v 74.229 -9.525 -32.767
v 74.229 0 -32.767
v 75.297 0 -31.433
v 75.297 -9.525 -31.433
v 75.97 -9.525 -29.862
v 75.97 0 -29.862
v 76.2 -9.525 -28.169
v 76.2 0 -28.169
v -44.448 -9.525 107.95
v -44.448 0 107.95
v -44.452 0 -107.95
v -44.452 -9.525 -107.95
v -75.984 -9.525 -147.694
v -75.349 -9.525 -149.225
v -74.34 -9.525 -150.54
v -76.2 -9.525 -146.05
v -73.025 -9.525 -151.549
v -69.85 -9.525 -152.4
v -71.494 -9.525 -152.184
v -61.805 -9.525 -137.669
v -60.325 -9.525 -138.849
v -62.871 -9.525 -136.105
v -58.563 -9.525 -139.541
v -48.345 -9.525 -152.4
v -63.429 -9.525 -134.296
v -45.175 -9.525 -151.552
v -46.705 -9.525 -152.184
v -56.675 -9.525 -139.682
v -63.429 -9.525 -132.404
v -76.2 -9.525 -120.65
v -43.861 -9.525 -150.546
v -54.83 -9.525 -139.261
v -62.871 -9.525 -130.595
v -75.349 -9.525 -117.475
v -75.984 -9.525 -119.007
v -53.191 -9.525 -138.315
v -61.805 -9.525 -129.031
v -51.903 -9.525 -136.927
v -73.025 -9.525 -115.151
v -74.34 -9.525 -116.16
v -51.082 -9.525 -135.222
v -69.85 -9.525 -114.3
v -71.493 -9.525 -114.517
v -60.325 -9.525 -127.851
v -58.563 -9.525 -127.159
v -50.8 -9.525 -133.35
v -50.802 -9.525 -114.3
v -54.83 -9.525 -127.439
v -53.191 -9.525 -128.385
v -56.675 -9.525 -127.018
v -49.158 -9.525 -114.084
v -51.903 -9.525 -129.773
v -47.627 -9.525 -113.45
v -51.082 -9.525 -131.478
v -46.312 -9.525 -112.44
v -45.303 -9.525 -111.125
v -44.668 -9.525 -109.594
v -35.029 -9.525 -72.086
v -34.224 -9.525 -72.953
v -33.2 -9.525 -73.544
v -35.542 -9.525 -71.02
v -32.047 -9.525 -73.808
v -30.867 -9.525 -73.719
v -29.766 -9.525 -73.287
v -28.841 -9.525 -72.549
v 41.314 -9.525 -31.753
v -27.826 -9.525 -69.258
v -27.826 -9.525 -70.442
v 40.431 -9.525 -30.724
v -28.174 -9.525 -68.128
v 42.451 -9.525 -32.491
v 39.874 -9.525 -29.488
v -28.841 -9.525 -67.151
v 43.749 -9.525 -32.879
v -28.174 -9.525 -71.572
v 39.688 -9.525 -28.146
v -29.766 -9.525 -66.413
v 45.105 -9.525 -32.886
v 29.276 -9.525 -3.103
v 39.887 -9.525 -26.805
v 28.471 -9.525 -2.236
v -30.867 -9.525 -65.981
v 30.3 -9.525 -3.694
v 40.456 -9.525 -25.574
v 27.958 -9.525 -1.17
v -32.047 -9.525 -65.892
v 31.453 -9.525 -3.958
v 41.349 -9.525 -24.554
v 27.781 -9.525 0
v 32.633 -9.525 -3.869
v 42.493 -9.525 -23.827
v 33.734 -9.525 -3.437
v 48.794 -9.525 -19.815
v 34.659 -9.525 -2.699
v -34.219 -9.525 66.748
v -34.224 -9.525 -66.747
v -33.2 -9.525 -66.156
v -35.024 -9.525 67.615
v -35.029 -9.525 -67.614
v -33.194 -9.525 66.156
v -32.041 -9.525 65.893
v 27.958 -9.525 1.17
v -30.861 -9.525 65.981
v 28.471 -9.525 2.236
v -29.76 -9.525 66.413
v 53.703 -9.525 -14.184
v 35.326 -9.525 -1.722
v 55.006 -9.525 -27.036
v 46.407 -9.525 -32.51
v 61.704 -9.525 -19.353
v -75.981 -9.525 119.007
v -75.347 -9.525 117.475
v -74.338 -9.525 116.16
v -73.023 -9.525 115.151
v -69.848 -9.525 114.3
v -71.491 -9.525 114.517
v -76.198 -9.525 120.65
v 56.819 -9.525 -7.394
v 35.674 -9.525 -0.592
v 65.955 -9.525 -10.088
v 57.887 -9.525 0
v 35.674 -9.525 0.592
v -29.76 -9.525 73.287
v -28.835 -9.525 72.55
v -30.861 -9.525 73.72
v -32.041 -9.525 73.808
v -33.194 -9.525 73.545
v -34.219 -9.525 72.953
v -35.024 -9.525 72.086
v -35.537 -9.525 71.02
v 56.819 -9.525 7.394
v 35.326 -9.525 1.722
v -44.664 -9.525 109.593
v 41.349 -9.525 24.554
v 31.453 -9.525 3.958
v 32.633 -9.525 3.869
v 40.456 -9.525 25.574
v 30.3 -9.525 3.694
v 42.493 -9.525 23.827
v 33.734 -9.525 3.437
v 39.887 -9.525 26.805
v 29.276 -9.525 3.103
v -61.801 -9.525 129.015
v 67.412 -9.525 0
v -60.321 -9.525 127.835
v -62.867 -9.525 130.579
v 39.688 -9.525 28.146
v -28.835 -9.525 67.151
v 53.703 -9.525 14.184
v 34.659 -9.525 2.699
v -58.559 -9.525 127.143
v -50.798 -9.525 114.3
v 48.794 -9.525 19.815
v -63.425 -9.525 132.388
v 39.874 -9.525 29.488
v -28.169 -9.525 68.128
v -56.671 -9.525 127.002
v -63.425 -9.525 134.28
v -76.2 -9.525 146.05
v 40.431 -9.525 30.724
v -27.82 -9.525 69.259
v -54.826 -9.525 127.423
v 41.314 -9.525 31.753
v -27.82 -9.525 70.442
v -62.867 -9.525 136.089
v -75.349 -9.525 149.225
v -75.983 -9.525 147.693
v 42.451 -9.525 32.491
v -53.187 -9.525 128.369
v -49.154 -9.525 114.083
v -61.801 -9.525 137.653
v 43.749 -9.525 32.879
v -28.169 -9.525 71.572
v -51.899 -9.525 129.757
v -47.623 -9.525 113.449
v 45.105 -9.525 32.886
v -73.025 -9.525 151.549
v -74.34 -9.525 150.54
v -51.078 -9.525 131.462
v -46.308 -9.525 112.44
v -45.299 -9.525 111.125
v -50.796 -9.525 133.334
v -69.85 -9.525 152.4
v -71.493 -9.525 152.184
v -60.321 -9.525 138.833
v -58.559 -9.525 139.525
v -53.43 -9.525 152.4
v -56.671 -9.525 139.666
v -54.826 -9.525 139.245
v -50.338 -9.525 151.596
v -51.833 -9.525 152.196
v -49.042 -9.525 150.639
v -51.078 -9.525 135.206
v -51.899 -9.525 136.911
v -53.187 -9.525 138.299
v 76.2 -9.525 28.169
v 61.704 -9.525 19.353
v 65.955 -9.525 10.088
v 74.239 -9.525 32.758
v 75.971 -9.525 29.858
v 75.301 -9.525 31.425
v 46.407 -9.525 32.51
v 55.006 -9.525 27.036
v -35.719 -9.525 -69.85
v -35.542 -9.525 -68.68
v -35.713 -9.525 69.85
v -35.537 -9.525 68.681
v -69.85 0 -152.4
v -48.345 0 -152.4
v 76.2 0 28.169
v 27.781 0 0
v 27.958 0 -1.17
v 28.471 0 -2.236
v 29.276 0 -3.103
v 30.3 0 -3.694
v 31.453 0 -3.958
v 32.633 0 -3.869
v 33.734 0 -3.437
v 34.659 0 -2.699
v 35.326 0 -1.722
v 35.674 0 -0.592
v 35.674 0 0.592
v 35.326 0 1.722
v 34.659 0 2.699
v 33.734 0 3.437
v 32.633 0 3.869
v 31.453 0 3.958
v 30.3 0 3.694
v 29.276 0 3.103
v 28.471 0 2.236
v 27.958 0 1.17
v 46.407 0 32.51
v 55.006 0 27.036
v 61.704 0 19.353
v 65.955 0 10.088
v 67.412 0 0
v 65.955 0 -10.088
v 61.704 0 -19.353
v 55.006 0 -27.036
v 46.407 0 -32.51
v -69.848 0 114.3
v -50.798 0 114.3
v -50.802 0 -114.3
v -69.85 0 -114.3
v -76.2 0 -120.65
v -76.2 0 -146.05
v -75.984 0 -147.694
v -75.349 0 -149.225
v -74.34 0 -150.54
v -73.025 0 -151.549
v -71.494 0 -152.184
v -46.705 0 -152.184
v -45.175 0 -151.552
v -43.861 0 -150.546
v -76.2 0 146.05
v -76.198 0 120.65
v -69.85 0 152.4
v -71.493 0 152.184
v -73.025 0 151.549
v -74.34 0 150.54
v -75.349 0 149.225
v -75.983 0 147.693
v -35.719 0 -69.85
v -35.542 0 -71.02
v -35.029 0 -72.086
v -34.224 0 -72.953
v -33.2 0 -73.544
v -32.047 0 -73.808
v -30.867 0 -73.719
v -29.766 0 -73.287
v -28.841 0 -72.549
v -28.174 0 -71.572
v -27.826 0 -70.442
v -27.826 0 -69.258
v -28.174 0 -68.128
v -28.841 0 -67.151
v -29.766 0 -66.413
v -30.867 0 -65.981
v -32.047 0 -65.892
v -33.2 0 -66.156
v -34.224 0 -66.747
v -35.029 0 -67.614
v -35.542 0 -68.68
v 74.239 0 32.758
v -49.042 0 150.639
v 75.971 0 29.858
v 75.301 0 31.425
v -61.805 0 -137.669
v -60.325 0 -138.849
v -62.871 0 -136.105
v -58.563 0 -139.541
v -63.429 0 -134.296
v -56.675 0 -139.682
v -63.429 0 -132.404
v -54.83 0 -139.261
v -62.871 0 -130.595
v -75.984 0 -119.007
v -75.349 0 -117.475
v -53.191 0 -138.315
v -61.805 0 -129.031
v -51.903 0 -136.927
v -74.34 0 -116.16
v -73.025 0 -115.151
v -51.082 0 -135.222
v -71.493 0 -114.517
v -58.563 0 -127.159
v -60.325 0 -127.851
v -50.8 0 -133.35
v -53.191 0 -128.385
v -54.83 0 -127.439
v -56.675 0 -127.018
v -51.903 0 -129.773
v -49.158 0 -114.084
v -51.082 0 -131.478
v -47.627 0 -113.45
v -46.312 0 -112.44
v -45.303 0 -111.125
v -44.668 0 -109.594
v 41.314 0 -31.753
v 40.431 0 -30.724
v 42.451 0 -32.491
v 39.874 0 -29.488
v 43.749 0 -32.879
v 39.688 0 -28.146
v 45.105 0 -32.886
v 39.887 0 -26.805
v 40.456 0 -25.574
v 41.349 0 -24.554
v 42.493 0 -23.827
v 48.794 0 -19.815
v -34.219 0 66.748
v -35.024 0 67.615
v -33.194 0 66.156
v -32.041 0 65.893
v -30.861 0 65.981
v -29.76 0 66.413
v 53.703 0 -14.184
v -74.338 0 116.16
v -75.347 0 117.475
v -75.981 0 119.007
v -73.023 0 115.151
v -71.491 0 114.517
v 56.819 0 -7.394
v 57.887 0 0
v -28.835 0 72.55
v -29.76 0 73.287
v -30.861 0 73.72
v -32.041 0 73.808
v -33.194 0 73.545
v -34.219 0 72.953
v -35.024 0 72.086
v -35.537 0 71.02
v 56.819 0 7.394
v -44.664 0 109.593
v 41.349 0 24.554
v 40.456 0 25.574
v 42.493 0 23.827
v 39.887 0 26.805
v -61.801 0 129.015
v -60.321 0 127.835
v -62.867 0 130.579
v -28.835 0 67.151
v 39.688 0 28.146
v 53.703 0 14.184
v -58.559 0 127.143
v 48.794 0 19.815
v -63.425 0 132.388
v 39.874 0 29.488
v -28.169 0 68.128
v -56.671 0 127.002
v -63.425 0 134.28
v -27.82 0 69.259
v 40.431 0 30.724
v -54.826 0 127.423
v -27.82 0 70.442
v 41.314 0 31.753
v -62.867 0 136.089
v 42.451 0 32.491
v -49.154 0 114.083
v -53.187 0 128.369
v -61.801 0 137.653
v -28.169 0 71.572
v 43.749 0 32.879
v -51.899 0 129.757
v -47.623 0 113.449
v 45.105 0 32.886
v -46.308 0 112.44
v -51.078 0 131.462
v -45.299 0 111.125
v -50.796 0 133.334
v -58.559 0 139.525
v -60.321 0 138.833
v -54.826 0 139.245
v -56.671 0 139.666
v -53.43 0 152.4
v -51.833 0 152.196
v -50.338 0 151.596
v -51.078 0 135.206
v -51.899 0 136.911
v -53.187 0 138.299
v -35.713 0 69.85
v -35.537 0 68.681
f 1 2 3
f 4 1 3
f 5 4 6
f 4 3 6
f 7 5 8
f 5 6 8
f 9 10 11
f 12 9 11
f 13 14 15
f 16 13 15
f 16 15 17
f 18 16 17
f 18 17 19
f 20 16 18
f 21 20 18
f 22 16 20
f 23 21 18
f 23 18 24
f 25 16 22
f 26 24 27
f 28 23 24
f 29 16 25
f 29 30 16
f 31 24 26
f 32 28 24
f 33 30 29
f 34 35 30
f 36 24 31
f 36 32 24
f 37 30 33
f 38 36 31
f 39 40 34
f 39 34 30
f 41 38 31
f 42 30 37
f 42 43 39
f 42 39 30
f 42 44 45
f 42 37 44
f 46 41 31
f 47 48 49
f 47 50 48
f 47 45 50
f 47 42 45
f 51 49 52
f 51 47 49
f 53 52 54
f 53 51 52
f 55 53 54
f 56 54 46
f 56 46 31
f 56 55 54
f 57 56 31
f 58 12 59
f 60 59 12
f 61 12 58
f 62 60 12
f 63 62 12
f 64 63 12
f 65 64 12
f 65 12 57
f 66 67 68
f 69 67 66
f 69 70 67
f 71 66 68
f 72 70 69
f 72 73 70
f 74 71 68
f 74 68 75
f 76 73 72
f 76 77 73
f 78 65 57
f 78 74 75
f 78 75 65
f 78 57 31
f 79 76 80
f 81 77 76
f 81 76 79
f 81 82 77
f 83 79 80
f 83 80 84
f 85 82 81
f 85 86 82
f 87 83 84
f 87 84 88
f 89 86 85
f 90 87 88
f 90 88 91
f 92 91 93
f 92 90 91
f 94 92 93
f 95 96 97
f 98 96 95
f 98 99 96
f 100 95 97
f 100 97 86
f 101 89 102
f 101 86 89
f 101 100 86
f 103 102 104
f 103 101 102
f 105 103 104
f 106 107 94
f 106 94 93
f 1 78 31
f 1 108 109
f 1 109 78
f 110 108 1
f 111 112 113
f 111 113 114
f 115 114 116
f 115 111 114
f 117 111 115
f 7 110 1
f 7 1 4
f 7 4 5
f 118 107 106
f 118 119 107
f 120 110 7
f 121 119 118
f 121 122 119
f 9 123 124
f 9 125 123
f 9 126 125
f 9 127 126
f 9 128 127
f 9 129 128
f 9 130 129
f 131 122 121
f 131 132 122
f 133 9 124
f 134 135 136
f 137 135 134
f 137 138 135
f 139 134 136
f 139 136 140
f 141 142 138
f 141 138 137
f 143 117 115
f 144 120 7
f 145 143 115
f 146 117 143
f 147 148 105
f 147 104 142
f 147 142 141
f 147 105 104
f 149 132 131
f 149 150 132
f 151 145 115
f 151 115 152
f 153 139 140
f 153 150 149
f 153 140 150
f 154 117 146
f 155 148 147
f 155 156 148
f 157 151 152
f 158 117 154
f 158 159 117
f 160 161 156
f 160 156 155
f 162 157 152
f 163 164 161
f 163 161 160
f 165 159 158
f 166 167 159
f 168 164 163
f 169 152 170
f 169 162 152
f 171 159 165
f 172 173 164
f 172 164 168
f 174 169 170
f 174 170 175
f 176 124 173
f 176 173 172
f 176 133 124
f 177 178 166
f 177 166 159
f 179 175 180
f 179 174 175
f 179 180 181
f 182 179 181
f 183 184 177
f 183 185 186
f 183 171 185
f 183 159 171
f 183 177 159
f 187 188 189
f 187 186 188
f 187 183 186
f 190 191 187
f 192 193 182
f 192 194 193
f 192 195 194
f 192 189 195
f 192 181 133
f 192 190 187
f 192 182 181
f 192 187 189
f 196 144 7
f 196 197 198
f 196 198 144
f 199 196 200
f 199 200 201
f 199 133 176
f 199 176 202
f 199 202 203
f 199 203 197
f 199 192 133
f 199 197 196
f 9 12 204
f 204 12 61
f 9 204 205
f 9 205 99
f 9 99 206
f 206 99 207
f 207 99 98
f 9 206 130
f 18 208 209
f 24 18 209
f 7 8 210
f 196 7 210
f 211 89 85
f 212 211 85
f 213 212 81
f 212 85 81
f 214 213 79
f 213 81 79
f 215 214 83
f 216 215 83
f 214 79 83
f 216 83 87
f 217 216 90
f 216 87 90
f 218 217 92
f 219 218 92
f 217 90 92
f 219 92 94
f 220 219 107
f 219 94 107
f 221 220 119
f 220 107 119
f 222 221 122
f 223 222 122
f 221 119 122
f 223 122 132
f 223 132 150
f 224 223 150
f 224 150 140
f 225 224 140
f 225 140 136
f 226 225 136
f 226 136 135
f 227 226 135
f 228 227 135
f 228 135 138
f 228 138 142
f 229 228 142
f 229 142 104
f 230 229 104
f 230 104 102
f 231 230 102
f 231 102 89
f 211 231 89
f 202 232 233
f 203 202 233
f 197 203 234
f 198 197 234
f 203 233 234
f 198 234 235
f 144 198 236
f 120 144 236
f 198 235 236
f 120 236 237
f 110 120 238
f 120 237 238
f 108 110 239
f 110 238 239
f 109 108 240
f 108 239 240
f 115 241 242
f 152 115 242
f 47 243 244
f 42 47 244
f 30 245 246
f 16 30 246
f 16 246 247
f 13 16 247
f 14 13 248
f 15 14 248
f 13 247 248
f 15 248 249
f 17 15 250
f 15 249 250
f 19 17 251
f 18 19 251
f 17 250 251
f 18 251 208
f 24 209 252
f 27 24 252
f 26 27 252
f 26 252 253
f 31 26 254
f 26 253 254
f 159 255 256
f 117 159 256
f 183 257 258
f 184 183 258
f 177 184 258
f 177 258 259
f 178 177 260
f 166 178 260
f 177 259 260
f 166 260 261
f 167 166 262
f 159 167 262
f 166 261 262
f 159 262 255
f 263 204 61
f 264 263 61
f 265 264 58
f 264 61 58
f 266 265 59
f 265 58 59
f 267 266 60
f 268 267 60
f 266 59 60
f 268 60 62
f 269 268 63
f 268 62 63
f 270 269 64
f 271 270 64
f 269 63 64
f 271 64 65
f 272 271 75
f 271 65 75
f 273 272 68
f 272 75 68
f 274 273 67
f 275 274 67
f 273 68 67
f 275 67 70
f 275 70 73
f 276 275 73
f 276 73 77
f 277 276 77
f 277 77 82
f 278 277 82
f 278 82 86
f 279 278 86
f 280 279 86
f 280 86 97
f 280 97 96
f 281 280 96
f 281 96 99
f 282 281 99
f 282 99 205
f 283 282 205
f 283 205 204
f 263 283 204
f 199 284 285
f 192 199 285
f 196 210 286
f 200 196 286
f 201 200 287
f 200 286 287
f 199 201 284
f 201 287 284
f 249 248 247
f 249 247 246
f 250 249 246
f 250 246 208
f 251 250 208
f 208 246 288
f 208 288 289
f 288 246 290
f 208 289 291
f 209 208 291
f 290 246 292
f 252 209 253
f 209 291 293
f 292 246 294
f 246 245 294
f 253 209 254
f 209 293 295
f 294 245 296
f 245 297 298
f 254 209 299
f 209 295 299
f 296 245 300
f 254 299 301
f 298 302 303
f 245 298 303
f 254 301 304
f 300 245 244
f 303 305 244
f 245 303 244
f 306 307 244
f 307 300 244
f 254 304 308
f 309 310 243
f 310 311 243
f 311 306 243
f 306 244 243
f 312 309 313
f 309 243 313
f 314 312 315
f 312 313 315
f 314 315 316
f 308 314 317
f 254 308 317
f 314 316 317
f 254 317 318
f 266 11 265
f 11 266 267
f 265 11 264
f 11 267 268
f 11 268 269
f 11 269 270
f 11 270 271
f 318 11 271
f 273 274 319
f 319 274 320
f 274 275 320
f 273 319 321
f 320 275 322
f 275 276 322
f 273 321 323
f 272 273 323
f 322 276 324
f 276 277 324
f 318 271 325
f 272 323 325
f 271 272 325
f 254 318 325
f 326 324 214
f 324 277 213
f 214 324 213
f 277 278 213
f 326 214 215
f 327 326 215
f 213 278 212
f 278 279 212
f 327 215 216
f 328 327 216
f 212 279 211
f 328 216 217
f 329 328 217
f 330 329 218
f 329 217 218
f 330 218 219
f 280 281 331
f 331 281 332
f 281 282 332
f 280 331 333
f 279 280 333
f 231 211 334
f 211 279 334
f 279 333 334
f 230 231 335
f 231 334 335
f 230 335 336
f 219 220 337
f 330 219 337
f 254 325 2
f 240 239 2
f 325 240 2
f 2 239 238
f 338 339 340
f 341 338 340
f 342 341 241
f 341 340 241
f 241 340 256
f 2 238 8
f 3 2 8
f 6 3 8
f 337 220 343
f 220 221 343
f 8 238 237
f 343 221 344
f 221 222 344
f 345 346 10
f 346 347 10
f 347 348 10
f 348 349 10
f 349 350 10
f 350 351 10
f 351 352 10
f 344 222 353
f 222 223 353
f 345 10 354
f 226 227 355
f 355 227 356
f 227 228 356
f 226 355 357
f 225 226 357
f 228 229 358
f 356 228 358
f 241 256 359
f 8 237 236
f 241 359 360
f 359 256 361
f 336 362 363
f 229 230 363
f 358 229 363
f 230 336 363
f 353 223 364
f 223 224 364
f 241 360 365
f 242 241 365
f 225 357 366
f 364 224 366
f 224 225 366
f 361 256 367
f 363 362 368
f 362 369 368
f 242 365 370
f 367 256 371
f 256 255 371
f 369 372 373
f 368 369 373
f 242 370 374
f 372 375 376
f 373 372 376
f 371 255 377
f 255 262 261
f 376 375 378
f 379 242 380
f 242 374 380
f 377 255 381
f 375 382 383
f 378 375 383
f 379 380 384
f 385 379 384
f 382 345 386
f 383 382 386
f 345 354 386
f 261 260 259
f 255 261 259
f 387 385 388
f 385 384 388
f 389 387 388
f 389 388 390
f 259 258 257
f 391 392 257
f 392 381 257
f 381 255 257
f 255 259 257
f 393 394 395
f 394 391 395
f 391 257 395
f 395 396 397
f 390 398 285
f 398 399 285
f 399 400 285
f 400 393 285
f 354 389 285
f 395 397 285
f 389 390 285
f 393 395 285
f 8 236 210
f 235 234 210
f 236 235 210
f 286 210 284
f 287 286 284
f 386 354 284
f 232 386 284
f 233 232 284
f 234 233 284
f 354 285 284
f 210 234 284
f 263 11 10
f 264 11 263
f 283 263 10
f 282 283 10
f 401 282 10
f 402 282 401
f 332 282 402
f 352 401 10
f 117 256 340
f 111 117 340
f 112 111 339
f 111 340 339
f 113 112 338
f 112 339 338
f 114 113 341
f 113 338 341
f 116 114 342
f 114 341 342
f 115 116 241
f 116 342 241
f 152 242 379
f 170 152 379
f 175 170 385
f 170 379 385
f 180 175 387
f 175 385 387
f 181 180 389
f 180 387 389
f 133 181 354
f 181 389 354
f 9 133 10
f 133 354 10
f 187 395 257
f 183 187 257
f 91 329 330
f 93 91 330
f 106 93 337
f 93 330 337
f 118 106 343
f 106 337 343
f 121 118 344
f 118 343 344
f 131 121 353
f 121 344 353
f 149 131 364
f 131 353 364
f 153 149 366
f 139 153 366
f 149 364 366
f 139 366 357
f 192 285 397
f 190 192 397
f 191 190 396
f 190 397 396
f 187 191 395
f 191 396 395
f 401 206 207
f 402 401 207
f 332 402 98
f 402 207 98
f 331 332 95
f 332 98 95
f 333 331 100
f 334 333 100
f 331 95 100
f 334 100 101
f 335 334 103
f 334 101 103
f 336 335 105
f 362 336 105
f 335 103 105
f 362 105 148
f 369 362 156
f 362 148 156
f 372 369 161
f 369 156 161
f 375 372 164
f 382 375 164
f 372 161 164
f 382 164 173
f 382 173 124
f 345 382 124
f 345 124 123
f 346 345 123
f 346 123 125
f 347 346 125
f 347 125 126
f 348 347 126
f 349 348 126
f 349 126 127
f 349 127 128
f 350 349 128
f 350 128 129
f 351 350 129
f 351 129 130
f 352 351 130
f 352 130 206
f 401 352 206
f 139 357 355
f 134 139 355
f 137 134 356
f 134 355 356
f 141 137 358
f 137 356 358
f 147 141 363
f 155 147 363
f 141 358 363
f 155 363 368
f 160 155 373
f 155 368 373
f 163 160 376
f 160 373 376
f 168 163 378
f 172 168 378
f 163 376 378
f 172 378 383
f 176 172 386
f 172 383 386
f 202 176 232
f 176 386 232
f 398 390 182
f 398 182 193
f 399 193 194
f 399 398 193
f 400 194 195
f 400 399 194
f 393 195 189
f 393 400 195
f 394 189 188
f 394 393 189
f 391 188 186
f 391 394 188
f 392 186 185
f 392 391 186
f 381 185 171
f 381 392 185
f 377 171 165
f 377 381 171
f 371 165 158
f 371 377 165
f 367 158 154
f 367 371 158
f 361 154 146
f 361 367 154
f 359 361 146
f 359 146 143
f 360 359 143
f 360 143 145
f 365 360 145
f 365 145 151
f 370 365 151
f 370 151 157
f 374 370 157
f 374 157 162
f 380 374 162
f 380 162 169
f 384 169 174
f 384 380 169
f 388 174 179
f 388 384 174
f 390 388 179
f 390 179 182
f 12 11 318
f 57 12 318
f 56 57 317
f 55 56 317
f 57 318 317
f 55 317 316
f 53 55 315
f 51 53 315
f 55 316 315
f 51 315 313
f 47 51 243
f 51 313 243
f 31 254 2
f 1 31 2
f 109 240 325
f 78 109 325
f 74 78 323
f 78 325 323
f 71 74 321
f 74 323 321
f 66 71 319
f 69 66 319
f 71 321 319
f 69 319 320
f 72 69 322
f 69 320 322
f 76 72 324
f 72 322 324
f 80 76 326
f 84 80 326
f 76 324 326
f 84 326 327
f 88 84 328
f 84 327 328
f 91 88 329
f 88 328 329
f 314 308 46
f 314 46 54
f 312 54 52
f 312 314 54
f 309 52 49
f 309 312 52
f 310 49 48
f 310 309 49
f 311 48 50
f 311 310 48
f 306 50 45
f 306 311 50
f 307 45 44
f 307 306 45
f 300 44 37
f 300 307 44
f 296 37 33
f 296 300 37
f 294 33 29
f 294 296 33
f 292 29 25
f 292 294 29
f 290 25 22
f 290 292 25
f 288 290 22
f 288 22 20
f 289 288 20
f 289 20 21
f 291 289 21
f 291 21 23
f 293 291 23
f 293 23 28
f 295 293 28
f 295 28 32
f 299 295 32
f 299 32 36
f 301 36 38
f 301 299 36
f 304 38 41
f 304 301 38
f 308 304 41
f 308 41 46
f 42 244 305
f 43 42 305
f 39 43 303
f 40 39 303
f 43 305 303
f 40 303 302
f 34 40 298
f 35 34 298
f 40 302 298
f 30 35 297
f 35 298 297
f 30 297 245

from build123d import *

# Parameters (mm, degrees)
F0_R     = 6.35
F1_DEPTH = 9.525
F2_D     = 7.9375


with BuildPart() as f1:
    # F0 (on Front) → F1 (new body)
    with BuildSketch(Plane.XZ):
        with BuildLine():
            Line((76.2, -28.1686), (76.2, 28.1686))
            ThreePointArc((76.2, 28.1686), (75.6890722442, 30.6641430927), (74.2385085583, 32.7580980808))
            Line((74.2385085583, 32.7580980808), (-49.0417475627, 150.6394980808))
            ThreePointArc((-49.0417475627, 150.6394980808), (-51.0660239849, 151.9434630233), (-53.4302561211, 152.4))
            Line((-53.4302561211, 152.4), (-69.8495712494, 152.4))
            ThreePointArc((-69.8495712494, 152.4), (-74.3398508885, 150.5399764769), (-76.1995712349, 146.0495712639))
            Line((-76.1995712349, 146.0495712639), (-76.197856327, 120.6501128256))
            ThreePointArc((-76.197856327, 120.6501128256), (-74.3380242773, 116.1600246552), (-69.8479691527, 114.3001128266))
            Line((-69.8479691527, 114.3001128266), (-50.7979691557, 114.2997743497))
            ThreePointArc((-50.7979691557, 114.2997743497), (-46.3078741417, 112.4398226308), (-44.4480819823, 107.9496615251))
            Line((-44.4480819823, 107.9496615251), (-44.4519180538, -107.9503384408))
            ThreePointArc((-44.4519180538, -107.9503384408), (-46.3118298823, -112.4403935654), (-50.8019180528, -114.3002256152))
            Line((-50.8019180528, -114.3002256152), (-69.850000004, -114.3002256152))
            ThreePointArc((-69.850000004, -114.3002256152), (-74.3400482968, -116.1600177883), (-76.2, -120.65))
            Line((-76.2, -120.65), (-76.2, -146.05))
            ThreePointArc((-76.2, -146.05), (-74.3401280605, -150.5401280605), (-69.85, -152.4))
            Line((-69.85, -152.4), (-48.3453483747, -152.4))
            ThreePointArc((-48.3453483747, -152.4), (-45.9191803183, -151.9182372619), (-43.861150015, -150.5460499408))
            Line((-43.861150015, -150.5460499408), (74.2293103448, -32.7668758621))
            ThreePointArc((74.2293103448, -32.7668758621), (75.6865709406, -30.669987546), (76.2, -28.1686))
        make_face()
        with Locations((-57.15, -133.3500654614)):
            Circle(F0_R, mode=Mode.SUBTRACT)
        with Locations((-57.1459382772, 133.333966136)):
            Circle(F0_R, mode=Mode.SUBTRACT)
        with BuildLine():
            ThreePointArc((42.4925458609, 23.8269667194), (40.1083667194, 30.1260541391), (46.4074541391, 32.5102332806))
            ThreePointArc((46.4074541391, 32.5102332806), (67.411691348, 0), (46.4074541391, -32.5102332806))
            ThreePointArc((46.4074541391, -32.5102332806), (40.1083667194, -30.1260541391), (42.4925458609, -23.8269667194))
            ThreePointArc((42.4925458609, -23.8269667194), (57.886691348, 0), (42.4925458609, 23.8269667194))
        make_face(mode=Mode.SUBTRACT)
    extrude(amount=F1_DEPTH)

    # F2 (through all)
    with Locations(Plane(origin=(0, 0, 0), x_dir=(1, 0, 0), z_dir=(0, 1, 0))):
        with Locations((31.75, 0), (-31.7444263581, -69.8504291124), (-31.75, 69.85)):
            Hole(F2_D / 2)


solid = f1.part
